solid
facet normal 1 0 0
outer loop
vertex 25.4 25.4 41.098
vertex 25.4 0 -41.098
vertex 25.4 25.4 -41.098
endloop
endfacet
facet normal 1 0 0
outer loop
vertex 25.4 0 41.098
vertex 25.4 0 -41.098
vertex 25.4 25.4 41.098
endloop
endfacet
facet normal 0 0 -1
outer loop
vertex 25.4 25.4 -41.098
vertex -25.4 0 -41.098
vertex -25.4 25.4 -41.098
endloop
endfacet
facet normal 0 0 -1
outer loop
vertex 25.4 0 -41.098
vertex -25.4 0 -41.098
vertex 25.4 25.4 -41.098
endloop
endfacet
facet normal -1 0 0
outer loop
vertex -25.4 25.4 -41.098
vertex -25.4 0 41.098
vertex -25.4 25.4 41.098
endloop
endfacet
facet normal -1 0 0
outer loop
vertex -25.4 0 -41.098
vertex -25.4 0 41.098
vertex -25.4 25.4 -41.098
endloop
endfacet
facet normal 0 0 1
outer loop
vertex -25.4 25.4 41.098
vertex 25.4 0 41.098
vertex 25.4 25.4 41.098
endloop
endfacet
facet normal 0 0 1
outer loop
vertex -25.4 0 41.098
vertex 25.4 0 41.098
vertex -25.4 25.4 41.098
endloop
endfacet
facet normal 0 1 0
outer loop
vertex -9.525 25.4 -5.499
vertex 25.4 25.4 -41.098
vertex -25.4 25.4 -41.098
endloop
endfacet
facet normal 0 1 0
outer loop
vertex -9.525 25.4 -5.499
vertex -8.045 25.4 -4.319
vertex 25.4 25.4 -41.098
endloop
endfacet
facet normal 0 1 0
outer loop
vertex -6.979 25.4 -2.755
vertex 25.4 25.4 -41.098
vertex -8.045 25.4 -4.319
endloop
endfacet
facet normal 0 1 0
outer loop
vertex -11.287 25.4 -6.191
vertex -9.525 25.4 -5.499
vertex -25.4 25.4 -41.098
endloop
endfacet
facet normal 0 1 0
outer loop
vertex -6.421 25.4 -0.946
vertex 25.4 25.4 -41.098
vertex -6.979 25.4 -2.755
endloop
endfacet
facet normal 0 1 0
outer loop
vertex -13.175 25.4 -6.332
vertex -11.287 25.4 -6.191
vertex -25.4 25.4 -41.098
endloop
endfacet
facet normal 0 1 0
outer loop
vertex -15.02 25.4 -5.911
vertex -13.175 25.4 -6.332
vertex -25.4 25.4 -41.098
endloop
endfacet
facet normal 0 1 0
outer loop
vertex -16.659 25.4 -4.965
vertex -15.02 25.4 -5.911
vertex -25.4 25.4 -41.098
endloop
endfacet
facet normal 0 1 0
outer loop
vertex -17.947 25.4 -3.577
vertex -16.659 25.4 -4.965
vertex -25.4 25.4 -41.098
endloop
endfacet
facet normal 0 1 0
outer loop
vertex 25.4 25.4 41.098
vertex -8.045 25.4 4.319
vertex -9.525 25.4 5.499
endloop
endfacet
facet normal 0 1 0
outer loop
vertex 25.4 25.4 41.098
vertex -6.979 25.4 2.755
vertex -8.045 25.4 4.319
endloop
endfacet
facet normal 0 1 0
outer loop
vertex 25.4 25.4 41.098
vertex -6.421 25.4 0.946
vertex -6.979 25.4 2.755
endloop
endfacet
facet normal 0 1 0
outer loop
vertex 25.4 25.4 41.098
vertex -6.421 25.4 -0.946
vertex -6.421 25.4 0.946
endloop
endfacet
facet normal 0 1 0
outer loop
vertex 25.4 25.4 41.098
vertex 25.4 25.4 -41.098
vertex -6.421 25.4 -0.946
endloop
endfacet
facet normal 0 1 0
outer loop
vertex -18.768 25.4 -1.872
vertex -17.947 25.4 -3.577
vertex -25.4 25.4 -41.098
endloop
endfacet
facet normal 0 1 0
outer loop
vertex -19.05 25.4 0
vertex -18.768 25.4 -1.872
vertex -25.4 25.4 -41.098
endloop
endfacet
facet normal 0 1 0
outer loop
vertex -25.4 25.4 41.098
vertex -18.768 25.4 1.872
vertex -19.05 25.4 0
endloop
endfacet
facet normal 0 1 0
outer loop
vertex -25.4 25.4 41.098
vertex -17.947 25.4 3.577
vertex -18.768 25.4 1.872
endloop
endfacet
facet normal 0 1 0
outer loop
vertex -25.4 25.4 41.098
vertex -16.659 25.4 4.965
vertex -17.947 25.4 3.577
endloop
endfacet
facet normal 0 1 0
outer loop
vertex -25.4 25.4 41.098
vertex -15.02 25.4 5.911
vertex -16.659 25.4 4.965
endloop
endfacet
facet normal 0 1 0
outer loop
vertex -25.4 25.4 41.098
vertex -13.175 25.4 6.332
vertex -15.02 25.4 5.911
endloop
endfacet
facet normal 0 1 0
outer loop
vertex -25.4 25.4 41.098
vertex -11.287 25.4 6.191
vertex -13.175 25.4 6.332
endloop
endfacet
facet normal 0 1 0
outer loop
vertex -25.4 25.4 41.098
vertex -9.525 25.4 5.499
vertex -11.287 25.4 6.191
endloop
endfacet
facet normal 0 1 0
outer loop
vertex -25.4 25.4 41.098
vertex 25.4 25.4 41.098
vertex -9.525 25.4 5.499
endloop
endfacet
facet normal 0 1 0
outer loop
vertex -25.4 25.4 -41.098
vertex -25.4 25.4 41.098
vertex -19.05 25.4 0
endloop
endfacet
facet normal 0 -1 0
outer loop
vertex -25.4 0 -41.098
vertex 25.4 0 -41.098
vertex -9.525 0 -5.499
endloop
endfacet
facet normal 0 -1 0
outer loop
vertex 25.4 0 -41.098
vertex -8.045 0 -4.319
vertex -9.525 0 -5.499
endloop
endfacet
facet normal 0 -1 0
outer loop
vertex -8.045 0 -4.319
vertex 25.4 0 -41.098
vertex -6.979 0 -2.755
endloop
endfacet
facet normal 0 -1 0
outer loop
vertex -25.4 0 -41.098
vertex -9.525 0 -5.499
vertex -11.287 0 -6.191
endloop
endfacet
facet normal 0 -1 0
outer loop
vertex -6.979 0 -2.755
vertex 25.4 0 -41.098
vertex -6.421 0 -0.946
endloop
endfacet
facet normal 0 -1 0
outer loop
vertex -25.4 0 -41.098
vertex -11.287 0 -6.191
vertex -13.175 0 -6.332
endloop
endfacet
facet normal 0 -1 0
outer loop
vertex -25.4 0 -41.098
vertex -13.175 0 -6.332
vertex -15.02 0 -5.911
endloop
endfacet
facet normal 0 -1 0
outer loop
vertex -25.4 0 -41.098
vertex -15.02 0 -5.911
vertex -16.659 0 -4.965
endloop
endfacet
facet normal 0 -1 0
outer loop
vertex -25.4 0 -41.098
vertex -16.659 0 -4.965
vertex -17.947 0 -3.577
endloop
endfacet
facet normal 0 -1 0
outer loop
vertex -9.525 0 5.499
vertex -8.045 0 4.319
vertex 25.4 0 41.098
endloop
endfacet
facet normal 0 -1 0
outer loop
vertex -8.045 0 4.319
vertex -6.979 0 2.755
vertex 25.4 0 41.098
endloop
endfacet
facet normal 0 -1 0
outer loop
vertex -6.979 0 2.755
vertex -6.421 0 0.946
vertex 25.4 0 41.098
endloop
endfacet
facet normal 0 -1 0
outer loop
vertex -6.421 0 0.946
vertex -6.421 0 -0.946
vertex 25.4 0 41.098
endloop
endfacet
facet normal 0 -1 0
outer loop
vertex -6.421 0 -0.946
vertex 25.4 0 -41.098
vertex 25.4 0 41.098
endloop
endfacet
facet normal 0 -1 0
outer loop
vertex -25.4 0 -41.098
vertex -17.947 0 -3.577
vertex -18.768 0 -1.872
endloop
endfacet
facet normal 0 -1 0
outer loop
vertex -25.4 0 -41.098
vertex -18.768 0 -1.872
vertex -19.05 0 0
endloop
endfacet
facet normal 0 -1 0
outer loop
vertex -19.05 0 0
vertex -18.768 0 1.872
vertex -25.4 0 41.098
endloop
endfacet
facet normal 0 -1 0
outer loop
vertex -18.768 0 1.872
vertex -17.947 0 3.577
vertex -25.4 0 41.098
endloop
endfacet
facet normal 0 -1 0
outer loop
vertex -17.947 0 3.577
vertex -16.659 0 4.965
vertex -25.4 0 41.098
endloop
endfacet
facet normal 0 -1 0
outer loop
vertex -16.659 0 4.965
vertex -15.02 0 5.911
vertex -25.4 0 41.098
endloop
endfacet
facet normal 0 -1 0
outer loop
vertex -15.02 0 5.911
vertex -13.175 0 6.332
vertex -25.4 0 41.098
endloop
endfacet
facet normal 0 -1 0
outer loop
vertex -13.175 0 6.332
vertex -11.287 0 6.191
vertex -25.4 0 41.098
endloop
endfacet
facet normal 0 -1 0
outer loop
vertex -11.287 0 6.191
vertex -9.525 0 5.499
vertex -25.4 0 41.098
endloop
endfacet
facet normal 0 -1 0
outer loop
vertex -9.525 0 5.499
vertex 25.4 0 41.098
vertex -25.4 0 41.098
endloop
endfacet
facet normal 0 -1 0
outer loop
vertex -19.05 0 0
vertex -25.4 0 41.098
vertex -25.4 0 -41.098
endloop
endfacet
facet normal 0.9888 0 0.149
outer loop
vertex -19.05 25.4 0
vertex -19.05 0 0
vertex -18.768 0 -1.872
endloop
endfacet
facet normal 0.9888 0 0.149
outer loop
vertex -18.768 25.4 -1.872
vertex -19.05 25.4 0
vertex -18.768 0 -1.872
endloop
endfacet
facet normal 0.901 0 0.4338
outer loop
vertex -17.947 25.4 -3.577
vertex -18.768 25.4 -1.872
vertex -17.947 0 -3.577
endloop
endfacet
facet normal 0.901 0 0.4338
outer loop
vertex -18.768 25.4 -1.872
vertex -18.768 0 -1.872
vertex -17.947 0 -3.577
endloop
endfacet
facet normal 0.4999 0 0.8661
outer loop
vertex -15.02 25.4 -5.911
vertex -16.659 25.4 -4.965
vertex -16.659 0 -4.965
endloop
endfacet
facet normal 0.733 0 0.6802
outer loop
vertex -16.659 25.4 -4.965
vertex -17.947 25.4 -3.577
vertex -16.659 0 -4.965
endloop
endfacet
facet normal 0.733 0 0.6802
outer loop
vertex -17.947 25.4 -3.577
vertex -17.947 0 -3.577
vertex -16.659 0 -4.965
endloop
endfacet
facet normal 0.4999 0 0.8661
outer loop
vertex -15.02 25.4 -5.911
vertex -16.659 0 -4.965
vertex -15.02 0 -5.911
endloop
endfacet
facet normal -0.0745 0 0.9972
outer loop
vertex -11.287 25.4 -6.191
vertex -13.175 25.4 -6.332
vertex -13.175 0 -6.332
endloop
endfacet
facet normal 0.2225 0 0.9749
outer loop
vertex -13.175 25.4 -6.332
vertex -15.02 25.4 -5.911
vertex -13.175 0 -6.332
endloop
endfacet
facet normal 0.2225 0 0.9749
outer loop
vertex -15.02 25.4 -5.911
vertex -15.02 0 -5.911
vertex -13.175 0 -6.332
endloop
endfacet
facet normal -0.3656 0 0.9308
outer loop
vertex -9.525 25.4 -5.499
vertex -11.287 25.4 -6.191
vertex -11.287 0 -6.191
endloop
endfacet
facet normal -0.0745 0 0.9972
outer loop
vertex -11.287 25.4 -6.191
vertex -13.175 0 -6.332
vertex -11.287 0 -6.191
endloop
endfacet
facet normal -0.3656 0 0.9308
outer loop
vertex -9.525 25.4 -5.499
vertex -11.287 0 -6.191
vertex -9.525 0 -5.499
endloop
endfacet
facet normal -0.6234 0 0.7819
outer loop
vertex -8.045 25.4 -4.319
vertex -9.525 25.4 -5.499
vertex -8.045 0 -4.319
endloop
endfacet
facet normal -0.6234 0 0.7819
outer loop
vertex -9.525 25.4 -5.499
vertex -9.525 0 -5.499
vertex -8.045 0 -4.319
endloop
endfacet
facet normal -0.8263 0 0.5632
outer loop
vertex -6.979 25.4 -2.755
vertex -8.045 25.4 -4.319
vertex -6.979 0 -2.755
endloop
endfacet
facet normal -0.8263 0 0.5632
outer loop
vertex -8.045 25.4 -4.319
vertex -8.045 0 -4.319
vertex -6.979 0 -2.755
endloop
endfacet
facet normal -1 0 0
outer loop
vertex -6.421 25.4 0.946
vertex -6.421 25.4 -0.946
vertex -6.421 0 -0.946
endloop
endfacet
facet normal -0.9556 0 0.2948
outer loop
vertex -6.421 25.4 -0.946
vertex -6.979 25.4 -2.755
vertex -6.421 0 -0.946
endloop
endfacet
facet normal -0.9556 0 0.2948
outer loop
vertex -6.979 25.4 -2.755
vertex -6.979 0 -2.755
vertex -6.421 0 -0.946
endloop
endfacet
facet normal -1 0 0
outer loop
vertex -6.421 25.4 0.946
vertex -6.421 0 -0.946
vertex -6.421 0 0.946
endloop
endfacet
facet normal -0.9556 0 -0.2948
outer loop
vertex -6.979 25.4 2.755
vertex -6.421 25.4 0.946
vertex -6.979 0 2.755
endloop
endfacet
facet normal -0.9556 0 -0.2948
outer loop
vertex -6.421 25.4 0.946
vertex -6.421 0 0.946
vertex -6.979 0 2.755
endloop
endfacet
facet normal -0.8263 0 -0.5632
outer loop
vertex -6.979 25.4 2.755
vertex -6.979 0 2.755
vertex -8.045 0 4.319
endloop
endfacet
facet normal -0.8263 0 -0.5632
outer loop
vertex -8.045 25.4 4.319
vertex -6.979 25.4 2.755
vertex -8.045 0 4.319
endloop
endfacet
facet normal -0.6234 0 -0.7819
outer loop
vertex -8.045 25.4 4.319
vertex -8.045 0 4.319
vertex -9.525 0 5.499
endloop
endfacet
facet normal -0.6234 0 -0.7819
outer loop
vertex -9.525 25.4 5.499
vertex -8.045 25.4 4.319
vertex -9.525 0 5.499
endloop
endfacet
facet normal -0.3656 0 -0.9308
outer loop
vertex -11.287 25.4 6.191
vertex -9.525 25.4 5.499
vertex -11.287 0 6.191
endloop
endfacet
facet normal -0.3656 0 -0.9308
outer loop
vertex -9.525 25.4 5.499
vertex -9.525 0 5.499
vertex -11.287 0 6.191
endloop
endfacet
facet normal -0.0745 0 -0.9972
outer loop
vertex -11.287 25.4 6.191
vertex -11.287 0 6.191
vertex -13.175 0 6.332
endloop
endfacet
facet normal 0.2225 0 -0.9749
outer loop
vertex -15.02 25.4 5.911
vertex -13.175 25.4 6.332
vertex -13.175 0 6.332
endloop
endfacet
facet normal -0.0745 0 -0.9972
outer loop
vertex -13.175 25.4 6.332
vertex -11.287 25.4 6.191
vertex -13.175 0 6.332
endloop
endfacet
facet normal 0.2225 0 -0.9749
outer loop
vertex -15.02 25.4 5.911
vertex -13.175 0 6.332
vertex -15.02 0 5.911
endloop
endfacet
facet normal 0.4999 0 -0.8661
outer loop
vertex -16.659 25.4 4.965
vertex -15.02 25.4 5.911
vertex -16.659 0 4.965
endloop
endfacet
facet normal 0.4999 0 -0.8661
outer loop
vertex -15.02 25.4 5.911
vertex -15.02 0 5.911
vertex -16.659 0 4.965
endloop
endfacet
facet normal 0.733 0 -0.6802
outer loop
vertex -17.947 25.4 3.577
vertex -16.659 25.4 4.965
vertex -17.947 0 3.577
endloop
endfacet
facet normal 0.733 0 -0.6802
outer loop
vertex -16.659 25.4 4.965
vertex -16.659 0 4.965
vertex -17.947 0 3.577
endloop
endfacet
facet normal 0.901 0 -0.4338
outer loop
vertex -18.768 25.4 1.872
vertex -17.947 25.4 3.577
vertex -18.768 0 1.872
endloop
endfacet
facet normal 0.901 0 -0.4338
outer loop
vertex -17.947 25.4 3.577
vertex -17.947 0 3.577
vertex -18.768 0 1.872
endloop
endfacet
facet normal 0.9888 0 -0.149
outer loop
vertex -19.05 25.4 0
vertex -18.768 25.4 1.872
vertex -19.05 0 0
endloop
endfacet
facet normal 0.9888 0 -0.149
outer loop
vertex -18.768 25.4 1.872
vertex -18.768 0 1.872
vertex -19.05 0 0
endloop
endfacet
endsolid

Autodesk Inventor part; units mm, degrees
ref_plane "YZ Plane" through (0, 0, 0) normal (1, 0, 0) x (0, 1, 0)
ref_plane "XZ Plane" through (0, 0, 0) normal (0, 1, 0) x (-1, 0, 0)
ref_plane "XY Plane" through (0, 0, 0) normal (0, 0, 1) x (1, 0, 0)
sketch "Sketch1" plane through (0, 0, 0) normal (0, 1, 0) x (-1, 0, 0)
  line L0 (-25.4, 41.0981) -> (25.4, 41.0981)
  line L1 (25.4, 41.0981) -> (25.4, -41.0981)
  line L2 (25.4, -41.0981) -> (-25.4, -41.0981)
  line L3 (-25.4, -41.0981) -> (-25.4, 41.0981)
  line L4 (-25.4, 41.0981) -> (25.4, -41.0981) construction
  line L5 (25.4, 41.0981) -> (-25.4, -41.0981) construction
  circle A0 centre (12.7, 0) radius 6.35
  line L6 (0, 0) -> (12.7, 0) construction
  dimension "d0" = 50.8
  dimension "d1" = 82.1961
  dimension "d2" = 12.7
  dimension "d3" = 12.7
extrude "Extrusion1" add sketch "Sketch1" along normal blind 25.4
properties part number "Motor Black Box" material "Stainless Steel"
